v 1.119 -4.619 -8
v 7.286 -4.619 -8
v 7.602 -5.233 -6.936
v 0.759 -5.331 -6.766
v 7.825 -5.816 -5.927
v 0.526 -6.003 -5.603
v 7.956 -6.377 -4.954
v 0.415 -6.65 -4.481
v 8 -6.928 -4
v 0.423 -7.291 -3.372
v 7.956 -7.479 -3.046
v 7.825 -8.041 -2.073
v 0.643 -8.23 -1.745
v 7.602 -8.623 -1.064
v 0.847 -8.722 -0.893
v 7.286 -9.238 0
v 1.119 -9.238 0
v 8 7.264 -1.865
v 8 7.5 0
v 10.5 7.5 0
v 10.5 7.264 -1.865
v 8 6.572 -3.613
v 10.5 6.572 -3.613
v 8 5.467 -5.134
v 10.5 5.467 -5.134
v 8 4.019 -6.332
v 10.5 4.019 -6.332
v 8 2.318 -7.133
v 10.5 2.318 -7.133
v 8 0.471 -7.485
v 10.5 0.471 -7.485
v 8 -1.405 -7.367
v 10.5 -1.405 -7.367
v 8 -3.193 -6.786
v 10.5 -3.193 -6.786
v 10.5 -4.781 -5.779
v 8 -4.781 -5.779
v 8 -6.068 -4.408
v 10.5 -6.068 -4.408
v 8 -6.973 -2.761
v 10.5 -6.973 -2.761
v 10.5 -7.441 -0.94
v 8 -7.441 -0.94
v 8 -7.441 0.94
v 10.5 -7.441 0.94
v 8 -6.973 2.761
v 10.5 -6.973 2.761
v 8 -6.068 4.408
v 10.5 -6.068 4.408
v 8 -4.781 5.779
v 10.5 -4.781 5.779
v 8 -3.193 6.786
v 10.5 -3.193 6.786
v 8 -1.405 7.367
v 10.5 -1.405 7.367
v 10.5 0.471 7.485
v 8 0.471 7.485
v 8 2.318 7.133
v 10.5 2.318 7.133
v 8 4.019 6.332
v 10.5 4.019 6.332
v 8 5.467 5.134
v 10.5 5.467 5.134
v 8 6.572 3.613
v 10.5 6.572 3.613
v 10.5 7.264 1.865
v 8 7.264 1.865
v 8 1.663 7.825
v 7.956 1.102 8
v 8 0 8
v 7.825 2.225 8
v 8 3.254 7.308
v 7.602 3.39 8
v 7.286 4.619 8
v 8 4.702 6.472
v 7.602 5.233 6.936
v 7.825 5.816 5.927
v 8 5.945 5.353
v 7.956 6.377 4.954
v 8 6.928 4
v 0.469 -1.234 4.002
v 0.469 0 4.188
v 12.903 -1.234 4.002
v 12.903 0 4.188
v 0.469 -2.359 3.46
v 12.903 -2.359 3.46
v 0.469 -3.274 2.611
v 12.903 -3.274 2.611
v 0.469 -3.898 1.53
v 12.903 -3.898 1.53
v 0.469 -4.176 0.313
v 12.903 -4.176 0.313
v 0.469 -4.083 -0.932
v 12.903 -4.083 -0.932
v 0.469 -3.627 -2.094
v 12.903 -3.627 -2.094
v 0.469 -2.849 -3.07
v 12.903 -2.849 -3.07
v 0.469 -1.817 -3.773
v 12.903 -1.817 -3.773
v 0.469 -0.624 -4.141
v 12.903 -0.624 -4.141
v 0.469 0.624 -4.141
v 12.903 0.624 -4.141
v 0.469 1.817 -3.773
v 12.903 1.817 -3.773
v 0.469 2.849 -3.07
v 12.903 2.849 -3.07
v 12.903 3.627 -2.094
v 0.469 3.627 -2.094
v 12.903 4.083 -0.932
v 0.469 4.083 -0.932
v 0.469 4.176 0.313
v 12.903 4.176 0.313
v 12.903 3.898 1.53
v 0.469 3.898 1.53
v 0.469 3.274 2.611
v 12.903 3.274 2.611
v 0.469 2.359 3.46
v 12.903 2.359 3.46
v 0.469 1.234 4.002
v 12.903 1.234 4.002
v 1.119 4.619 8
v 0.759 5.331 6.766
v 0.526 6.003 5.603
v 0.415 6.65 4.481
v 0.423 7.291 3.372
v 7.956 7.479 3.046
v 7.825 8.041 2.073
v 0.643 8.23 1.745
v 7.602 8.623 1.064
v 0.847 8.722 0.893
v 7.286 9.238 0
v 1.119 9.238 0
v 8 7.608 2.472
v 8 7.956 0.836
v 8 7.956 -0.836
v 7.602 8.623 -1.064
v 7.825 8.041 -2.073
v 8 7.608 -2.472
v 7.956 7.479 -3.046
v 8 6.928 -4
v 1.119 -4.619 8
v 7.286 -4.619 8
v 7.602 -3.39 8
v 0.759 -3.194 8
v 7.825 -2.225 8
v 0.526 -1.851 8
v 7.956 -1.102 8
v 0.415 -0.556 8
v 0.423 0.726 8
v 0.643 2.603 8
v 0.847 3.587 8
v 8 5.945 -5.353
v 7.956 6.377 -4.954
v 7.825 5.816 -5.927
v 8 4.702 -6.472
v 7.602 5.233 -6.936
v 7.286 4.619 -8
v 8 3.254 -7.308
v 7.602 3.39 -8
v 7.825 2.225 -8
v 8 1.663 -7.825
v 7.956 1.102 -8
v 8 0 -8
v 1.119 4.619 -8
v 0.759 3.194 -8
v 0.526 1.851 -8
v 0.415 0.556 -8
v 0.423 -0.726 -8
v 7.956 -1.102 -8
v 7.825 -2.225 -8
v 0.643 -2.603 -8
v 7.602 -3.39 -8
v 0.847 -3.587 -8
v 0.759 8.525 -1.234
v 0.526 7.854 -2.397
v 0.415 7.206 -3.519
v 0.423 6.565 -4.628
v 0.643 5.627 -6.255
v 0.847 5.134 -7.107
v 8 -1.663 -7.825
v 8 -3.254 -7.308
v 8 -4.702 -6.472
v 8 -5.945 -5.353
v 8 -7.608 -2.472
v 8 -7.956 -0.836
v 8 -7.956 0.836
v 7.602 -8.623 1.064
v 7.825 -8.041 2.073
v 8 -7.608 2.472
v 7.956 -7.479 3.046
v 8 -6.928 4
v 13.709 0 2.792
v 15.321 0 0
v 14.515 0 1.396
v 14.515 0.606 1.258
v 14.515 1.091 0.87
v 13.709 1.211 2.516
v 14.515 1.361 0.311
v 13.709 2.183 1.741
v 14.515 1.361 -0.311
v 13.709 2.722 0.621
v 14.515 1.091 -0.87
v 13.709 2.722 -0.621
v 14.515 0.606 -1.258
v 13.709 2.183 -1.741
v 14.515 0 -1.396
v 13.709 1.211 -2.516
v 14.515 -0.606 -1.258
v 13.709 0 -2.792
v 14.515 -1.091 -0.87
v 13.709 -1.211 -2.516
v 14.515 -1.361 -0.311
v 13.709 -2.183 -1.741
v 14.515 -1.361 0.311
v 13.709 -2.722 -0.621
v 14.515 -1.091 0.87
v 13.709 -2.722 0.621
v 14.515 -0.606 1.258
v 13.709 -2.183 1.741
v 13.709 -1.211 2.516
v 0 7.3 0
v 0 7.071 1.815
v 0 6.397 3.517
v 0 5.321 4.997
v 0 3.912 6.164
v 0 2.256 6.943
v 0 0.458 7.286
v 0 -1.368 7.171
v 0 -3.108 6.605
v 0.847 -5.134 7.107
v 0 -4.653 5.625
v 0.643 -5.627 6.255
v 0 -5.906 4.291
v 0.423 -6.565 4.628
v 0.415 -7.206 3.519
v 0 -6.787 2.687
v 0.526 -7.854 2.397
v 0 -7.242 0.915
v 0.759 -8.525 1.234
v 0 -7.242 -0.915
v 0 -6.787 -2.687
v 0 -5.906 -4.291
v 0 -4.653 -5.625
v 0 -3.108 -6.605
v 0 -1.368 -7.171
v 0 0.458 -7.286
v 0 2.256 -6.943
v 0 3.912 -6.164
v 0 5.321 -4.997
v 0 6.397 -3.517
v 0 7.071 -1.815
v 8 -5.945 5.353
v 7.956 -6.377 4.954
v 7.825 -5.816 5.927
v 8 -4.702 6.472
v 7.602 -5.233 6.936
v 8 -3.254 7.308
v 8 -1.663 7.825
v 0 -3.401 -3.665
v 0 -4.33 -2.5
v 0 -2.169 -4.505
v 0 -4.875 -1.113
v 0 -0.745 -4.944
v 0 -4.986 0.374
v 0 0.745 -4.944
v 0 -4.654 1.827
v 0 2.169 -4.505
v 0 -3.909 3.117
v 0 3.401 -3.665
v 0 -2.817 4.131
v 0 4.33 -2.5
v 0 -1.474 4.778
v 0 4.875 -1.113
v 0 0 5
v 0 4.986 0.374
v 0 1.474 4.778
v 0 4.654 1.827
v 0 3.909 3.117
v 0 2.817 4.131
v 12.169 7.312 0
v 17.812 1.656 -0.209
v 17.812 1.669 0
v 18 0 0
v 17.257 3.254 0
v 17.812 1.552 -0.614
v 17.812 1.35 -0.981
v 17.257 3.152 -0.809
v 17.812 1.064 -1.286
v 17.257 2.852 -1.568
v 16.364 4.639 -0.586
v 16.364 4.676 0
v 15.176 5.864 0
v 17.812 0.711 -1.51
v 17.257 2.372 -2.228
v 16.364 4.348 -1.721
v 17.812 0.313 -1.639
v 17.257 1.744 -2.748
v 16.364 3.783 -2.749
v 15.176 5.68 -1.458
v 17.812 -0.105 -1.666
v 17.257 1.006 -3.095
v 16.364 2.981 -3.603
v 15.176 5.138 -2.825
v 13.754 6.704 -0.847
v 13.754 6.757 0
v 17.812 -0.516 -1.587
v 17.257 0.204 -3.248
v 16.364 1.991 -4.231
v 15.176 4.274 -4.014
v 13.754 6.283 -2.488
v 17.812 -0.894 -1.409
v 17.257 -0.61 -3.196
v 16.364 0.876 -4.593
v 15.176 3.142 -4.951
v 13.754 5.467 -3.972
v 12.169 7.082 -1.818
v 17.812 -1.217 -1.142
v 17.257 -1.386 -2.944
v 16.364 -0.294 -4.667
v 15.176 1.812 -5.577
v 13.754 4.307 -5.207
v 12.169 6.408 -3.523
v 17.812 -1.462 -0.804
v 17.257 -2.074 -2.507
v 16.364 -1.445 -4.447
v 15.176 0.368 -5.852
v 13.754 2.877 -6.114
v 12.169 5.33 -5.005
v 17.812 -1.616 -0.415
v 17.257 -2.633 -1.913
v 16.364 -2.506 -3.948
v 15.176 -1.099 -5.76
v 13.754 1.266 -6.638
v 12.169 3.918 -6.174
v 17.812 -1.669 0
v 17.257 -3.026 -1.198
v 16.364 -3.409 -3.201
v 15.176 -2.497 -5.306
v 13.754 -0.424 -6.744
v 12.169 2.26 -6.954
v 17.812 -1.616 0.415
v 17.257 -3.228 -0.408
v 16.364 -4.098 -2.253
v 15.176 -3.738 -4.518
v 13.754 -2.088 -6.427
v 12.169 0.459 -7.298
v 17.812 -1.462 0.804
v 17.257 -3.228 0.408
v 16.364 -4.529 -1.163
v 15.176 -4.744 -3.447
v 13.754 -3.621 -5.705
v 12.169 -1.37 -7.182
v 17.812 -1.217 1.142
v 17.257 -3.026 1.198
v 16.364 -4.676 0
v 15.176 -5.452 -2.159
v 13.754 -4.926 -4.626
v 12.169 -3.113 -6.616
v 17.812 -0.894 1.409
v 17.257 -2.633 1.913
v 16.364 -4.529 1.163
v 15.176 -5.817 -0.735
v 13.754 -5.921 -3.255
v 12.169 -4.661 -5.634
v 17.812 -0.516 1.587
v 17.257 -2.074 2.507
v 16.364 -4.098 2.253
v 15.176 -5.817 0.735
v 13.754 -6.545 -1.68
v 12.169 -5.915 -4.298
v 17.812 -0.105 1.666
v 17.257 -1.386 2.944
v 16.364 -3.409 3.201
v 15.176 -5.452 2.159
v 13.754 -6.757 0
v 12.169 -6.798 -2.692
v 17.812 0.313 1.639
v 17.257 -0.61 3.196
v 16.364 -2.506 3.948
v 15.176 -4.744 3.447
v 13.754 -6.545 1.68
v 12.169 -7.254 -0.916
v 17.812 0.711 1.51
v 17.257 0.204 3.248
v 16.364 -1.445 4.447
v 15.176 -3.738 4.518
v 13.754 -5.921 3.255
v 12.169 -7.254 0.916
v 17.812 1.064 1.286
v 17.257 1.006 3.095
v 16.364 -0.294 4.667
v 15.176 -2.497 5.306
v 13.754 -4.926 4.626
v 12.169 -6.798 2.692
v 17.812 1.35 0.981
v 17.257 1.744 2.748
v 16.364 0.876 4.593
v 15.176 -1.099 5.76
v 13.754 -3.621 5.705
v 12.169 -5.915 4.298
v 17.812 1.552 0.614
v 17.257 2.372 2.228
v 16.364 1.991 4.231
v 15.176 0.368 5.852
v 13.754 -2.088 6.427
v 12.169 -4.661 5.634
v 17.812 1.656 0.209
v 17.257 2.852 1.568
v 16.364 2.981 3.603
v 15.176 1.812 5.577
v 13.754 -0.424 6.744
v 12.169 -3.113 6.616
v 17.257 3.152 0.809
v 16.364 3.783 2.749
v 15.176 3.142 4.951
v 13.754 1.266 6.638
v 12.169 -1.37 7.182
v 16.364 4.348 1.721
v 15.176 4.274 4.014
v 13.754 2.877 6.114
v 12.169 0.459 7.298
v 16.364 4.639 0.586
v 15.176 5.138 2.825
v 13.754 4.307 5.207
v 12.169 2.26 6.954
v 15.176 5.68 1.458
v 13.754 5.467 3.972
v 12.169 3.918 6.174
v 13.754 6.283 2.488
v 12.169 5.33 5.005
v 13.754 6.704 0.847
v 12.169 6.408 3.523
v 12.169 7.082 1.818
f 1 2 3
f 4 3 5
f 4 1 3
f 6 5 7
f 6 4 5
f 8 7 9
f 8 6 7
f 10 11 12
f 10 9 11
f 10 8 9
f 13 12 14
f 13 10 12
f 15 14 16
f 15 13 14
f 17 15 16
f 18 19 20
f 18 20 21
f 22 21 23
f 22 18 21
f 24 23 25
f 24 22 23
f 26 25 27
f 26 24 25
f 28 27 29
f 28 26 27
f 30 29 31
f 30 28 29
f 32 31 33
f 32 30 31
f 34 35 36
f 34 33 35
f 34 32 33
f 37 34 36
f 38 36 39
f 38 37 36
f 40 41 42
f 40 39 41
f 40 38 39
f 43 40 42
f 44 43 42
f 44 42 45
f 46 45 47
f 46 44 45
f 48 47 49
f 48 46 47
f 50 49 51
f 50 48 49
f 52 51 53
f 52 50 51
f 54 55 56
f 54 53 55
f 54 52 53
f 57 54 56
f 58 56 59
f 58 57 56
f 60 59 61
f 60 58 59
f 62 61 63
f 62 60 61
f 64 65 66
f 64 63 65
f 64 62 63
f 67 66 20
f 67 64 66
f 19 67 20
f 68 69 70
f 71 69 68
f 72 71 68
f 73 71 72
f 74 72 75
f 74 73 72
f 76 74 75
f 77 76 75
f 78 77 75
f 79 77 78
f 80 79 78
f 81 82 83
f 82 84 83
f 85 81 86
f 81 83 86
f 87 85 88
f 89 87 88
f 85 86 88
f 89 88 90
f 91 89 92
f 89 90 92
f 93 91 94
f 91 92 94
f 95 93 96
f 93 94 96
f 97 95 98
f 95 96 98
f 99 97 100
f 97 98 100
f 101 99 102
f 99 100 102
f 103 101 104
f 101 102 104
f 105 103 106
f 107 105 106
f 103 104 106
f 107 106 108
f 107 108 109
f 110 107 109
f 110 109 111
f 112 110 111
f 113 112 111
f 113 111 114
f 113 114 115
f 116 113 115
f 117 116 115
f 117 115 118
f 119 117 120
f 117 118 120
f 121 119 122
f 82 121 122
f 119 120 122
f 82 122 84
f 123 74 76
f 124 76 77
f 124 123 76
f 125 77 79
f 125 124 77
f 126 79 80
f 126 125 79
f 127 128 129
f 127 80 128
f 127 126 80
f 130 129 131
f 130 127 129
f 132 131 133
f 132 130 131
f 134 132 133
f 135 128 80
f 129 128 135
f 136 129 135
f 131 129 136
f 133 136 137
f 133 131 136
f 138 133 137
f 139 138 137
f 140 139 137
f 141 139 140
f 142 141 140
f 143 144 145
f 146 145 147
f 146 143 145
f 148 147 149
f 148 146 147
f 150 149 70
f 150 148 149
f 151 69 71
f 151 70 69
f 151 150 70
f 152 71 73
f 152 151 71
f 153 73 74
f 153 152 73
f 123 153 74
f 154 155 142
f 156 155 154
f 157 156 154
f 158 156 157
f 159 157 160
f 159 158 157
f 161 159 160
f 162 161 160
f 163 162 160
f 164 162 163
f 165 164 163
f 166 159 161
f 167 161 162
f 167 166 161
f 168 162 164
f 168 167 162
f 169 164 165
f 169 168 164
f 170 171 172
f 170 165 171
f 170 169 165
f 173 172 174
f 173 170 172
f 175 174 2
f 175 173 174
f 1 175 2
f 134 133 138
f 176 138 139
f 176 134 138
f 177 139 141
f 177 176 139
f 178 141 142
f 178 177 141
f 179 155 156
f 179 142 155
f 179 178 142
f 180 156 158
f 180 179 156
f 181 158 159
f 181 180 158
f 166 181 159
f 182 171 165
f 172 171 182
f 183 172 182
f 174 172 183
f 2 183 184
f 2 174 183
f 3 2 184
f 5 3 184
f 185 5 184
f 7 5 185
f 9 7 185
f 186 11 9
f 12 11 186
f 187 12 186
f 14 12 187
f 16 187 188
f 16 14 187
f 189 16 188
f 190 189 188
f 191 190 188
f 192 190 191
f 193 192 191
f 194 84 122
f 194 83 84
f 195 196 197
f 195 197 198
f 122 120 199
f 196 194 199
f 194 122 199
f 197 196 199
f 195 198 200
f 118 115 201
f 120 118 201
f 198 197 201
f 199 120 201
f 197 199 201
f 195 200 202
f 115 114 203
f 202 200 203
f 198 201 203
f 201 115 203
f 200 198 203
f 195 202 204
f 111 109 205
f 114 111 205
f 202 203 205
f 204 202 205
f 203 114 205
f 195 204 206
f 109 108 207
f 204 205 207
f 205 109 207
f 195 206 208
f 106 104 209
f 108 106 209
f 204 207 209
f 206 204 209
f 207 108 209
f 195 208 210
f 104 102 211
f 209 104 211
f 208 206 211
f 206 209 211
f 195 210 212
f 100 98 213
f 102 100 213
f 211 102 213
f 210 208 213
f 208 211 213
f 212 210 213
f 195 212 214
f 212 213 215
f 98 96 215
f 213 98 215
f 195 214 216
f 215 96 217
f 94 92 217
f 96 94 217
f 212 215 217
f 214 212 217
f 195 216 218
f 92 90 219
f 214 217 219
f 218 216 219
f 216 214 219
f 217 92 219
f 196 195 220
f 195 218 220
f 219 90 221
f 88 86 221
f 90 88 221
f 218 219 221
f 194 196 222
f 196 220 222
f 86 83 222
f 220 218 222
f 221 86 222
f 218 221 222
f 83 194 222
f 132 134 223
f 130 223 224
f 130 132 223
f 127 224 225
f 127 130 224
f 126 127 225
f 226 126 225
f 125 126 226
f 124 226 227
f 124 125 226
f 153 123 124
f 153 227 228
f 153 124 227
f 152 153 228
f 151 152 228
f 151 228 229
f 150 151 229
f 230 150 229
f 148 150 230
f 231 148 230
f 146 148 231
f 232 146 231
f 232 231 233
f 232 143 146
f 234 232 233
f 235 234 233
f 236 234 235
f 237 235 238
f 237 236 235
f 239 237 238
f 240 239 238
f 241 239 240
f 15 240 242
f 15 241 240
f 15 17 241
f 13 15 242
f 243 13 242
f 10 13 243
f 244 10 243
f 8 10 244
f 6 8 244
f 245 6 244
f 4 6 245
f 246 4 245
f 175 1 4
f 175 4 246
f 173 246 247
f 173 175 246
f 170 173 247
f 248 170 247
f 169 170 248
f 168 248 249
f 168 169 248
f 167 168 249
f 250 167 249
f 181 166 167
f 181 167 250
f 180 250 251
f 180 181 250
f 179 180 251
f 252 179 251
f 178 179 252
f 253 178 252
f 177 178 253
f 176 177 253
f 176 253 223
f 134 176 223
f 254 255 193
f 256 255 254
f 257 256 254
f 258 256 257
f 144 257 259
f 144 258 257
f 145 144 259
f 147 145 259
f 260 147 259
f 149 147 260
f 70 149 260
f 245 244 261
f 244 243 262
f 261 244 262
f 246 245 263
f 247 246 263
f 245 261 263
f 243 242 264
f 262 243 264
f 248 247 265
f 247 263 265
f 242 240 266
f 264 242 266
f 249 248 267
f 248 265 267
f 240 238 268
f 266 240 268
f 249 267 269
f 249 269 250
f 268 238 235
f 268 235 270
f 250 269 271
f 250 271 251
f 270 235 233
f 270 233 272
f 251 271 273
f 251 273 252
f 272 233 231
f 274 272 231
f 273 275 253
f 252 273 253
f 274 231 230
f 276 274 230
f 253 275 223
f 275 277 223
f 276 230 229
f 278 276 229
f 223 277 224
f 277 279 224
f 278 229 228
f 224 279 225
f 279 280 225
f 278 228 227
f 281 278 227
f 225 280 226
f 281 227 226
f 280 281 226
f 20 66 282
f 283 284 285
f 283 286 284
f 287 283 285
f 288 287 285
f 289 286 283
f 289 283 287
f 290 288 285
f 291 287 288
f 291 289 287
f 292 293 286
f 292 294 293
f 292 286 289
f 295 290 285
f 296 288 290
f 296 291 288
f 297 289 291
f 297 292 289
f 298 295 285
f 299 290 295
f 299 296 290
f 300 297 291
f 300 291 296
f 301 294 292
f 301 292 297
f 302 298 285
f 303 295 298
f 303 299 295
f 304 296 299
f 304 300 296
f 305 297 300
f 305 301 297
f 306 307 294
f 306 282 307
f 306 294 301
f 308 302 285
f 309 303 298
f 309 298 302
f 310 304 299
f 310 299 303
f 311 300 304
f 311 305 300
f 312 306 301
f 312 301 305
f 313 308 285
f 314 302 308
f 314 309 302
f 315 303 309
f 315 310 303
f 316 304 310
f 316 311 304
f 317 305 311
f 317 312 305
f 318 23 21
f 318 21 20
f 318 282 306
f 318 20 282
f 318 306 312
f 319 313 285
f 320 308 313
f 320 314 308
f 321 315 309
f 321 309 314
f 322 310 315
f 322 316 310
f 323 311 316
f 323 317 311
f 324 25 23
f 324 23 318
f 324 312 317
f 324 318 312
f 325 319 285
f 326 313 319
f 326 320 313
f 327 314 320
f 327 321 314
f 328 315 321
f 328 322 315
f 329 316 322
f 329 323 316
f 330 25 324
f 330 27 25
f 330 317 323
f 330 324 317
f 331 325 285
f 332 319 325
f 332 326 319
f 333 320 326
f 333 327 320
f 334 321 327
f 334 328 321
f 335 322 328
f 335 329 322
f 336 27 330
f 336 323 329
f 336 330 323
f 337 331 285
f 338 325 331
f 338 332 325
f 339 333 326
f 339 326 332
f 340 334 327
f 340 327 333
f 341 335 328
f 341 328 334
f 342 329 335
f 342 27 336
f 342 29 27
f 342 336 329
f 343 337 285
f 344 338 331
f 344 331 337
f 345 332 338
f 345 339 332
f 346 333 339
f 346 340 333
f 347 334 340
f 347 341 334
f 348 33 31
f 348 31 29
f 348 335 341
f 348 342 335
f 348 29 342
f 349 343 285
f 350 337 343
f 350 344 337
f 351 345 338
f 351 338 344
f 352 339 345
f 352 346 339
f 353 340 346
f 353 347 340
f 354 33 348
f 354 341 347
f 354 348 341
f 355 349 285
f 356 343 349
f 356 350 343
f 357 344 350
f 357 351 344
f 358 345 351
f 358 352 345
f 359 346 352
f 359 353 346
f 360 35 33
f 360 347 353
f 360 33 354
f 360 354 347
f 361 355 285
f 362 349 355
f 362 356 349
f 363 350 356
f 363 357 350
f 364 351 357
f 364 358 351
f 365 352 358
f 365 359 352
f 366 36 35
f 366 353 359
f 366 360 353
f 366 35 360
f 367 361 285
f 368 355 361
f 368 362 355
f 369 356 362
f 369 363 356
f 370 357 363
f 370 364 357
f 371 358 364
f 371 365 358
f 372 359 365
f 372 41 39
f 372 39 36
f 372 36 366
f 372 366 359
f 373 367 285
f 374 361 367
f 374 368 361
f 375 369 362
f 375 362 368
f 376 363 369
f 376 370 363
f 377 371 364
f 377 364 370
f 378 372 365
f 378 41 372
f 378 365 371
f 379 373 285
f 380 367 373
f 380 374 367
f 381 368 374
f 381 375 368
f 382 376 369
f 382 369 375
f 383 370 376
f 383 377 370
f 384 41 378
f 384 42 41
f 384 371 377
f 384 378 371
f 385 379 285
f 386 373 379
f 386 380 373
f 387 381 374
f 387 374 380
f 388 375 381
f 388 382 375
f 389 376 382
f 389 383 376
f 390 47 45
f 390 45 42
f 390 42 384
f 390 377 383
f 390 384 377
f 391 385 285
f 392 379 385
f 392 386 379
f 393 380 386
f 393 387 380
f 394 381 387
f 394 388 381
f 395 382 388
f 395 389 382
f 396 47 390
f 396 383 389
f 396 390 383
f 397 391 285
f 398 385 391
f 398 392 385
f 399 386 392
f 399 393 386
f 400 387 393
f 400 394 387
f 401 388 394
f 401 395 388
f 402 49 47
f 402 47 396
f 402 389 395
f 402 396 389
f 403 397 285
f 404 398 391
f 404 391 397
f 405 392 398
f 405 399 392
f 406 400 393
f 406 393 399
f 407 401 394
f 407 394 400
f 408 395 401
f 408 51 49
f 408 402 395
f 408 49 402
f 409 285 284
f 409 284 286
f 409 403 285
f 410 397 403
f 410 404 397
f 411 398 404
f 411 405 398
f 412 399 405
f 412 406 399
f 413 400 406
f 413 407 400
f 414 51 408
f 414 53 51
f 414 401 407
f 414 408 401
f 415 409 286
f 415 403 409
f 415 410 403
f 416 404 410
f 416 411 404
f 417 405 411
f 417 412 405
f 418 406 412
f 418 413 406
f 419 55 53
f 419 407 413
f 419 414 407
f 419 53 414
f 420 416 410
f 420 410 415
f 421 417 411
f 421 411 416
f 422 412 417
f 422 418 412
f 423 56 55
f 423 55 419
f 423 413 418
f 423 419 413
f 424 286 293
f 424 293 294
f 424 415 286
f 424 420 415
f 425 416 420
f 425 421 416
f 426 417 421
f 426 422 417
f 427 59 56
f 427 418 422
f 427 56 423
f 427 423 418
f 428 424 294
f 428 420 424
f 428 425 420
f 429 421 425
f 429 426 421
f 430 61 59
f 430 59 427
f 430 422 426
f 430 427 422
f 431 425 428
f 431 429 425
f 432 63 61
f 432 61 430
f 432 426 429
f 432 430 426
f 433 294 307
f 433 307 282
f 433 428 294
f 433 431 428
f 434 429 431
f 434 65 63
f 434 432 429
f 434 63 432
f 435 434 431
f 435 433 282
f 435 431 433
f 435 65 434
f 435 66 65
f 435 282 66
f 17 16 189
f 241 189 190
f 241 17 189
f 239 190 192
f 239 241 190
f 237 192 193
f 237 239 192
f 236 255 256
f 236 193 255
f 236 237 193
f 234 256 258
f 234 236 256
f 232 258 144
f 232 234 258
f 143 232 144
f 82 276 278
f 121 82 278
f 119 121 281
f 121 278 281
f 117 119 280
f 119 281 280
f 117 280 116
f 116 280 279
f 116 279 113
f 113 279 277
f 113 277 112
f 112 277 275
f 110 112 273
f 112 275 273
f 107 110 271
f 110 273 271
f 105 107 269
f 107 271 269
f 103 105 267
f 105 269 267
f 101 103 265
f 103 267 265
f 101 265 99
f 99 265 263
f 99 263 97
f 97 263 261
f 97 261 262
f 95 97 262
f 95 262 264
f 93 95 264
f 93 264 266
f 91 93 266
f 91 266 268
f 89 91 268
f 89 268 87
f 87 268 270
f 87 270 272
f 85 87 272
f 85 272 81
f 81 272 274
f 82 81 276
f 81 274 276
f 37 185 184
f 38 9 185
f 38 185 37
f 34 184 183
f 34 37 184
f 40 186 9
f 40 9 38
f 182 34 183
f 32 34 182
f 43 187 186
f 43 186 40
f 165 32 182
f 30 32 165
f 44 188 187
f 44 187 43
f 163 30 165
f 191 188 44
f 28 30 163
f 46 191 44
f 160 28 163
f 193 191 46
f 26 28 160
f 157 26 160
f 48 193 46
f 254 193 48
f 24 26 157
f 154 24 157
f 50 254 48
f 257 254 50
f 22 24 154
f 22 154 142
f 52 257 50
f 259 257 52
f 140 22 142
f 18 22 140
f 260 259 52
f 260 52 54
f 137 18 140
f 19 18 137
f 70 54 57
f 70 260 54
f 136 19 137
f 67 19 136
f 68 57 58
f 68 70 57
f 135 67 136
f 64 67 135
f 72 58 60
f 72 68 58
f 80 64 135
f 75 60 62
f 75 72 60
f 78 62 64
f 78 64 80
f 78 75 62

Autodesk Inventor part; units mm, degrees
ref_plane "YZ Plane" through (0, 0, 0) normal (1, 0, 0) x (0, 1, 0)
ref_plane "XZ Plane" through (0, 0, 0) normal (0, 1, 0) x (-1, 0, 0)
sketch "Sketch1" plane through (0, 0, 0) normal (1, 0, 0) x (0, 1, 0)
  line L0 (-4.6188, -8) -> (-9.2376, 0)
  line L1 (-9.2376, 0) -> (-4.6188, 8)
  line L2 (-4.6188, 8) -> (4.6188, 8)
  line L3 (4.6188, 8) -> (9.2376, 0)
  line L4 (9.2376, 0) -> (4.6188, -8)
  line L5 (4.6188, -8) -> (-4.6188, -8)
  point P0 (0, 0)
  point P1 (0, 0)
  dimension "d0" = 18.4752
extrude "Body" add sketch "Sketch1" along normal blind 8
sketch "Sketch2" plane through (0, 0, 0) normal (0, 0, 1) x (1, 0, 0)
  line L0 (8, 0) -> (18, 0)
  arc A0 (18, 0) -> (10.5, 7.5) centre (10.5, 0) ccw
  line L1 (10.5, 7.5) -> (8, 7.5)
  line L2 (8, -4.6188) -> (8, 4.6188) projected
  line L3 (8, 0) -> (8, 7.5)
  line L4 (5.6893, 0) -> (21.864, 0) projected
  dimension "d8" = 7.5
  dimension "d9" = 10
revolve "Cap" add sketch "Sketch2" angle 360 about axis through (8, 0, 0) along (1, 0, 0)
sketch "Sketch3" plane through (0, 0, 0) normal (-1, 0, 0) x (0, 0, 1)
  line L0 (0, -12.9326) -> (0, 12.9326) projected
  line L1 (-11.2, 0) -> (11.2, 0) projected
  point P0 (0, 0)
hole "Thread" at (0, 0, 0) direction (1, 0, 0) diameter 8.376 depth 12.903 tip angle 120 thread size "M10x1.5" class "6H" standard "ISO Metric profile"
sketch "Sketch4" plane through (0, 0, 0) normal (0, 0, 1) x (1, 0, 0)
  line L0 (0, 4.6188) -> (0, 9.2376) projected
  line L1 (0, 9.2376) -> (8, 9.2376) projected
  line L2 (8, 4.6188) -> (8, 9.2376) projected
  line L3 (-1.6, 0) -> (9.6, 0) projected
  line L4 (1.1187, 9.2376) -> (0, 7.3)
  line L5 (7.2855, 9.2376) -> (8, 8)
  dimension "d3" = 14.6
  dimension "d4" = 30
  dimension "d5" = 16
  dimension "d6" = 30
revolve "Chamfer1" cut sketch "Sketch4" angle 360 about axis through (-10, 0, 0) along (1, 0, 0)
chamfer "Chamfer2" distance 0.8119 angle 30 1 edges at (0, 0, -4.188) measured on face at (0, 6.1818, -0.7506)
ref_plane "Work Plane1" through (6.4515, 0, 0) normal (0, 0.866, -0.5) x (-1, 0, 0)
equation "\"d0\" = 1.1547 * SW"
equation "\"d1\" = SIH"
equation "\"d8\" = KR"
equation "\"d9\" = KOH1 - SIH"
equation "\"d11\" = GEL"
equation "\"d12\" = 1.02 * GEL"
equation "\"d3\" = SW0"
equation "\"d4\" = ANG1"
equation "\"d5\" = SW01"
equation "\"d6\" = ANG2"
equation "\"d14\" = -0.5 * GD1 + 0.5 * NND"
equation "\"d36\" = -0.5 * GD1 + 0.5 * NND"
equation "\"ANG1\" = 30deg"
equation "\"ANG2\" = 30deg"
equation "\"SIH\" = 8"
equation "\"KOH1\" = 18"
equation "\"GEL\" = 12.65"
equation "\"SW\" = 16"
equation "\"KR\" = 7.5"
equation "\"SW0\" = 14.6"
equation "\"SW01\" = SW"
equation "\"GUL\" = 0.541266 * PTC"
equation "\"TOA\" = 30deg"
equation "\"PTC\" = 1.5"
equation "\"E0\" = 1.155 * SW"
equation "\"GAL\" = 0.541266 * PTC"
equation "\"GD1\" = 8.376202"
equation "\"NND\" = 10"
properties part number "M10 DN A2" material "Stainless Steel AISI 304"
